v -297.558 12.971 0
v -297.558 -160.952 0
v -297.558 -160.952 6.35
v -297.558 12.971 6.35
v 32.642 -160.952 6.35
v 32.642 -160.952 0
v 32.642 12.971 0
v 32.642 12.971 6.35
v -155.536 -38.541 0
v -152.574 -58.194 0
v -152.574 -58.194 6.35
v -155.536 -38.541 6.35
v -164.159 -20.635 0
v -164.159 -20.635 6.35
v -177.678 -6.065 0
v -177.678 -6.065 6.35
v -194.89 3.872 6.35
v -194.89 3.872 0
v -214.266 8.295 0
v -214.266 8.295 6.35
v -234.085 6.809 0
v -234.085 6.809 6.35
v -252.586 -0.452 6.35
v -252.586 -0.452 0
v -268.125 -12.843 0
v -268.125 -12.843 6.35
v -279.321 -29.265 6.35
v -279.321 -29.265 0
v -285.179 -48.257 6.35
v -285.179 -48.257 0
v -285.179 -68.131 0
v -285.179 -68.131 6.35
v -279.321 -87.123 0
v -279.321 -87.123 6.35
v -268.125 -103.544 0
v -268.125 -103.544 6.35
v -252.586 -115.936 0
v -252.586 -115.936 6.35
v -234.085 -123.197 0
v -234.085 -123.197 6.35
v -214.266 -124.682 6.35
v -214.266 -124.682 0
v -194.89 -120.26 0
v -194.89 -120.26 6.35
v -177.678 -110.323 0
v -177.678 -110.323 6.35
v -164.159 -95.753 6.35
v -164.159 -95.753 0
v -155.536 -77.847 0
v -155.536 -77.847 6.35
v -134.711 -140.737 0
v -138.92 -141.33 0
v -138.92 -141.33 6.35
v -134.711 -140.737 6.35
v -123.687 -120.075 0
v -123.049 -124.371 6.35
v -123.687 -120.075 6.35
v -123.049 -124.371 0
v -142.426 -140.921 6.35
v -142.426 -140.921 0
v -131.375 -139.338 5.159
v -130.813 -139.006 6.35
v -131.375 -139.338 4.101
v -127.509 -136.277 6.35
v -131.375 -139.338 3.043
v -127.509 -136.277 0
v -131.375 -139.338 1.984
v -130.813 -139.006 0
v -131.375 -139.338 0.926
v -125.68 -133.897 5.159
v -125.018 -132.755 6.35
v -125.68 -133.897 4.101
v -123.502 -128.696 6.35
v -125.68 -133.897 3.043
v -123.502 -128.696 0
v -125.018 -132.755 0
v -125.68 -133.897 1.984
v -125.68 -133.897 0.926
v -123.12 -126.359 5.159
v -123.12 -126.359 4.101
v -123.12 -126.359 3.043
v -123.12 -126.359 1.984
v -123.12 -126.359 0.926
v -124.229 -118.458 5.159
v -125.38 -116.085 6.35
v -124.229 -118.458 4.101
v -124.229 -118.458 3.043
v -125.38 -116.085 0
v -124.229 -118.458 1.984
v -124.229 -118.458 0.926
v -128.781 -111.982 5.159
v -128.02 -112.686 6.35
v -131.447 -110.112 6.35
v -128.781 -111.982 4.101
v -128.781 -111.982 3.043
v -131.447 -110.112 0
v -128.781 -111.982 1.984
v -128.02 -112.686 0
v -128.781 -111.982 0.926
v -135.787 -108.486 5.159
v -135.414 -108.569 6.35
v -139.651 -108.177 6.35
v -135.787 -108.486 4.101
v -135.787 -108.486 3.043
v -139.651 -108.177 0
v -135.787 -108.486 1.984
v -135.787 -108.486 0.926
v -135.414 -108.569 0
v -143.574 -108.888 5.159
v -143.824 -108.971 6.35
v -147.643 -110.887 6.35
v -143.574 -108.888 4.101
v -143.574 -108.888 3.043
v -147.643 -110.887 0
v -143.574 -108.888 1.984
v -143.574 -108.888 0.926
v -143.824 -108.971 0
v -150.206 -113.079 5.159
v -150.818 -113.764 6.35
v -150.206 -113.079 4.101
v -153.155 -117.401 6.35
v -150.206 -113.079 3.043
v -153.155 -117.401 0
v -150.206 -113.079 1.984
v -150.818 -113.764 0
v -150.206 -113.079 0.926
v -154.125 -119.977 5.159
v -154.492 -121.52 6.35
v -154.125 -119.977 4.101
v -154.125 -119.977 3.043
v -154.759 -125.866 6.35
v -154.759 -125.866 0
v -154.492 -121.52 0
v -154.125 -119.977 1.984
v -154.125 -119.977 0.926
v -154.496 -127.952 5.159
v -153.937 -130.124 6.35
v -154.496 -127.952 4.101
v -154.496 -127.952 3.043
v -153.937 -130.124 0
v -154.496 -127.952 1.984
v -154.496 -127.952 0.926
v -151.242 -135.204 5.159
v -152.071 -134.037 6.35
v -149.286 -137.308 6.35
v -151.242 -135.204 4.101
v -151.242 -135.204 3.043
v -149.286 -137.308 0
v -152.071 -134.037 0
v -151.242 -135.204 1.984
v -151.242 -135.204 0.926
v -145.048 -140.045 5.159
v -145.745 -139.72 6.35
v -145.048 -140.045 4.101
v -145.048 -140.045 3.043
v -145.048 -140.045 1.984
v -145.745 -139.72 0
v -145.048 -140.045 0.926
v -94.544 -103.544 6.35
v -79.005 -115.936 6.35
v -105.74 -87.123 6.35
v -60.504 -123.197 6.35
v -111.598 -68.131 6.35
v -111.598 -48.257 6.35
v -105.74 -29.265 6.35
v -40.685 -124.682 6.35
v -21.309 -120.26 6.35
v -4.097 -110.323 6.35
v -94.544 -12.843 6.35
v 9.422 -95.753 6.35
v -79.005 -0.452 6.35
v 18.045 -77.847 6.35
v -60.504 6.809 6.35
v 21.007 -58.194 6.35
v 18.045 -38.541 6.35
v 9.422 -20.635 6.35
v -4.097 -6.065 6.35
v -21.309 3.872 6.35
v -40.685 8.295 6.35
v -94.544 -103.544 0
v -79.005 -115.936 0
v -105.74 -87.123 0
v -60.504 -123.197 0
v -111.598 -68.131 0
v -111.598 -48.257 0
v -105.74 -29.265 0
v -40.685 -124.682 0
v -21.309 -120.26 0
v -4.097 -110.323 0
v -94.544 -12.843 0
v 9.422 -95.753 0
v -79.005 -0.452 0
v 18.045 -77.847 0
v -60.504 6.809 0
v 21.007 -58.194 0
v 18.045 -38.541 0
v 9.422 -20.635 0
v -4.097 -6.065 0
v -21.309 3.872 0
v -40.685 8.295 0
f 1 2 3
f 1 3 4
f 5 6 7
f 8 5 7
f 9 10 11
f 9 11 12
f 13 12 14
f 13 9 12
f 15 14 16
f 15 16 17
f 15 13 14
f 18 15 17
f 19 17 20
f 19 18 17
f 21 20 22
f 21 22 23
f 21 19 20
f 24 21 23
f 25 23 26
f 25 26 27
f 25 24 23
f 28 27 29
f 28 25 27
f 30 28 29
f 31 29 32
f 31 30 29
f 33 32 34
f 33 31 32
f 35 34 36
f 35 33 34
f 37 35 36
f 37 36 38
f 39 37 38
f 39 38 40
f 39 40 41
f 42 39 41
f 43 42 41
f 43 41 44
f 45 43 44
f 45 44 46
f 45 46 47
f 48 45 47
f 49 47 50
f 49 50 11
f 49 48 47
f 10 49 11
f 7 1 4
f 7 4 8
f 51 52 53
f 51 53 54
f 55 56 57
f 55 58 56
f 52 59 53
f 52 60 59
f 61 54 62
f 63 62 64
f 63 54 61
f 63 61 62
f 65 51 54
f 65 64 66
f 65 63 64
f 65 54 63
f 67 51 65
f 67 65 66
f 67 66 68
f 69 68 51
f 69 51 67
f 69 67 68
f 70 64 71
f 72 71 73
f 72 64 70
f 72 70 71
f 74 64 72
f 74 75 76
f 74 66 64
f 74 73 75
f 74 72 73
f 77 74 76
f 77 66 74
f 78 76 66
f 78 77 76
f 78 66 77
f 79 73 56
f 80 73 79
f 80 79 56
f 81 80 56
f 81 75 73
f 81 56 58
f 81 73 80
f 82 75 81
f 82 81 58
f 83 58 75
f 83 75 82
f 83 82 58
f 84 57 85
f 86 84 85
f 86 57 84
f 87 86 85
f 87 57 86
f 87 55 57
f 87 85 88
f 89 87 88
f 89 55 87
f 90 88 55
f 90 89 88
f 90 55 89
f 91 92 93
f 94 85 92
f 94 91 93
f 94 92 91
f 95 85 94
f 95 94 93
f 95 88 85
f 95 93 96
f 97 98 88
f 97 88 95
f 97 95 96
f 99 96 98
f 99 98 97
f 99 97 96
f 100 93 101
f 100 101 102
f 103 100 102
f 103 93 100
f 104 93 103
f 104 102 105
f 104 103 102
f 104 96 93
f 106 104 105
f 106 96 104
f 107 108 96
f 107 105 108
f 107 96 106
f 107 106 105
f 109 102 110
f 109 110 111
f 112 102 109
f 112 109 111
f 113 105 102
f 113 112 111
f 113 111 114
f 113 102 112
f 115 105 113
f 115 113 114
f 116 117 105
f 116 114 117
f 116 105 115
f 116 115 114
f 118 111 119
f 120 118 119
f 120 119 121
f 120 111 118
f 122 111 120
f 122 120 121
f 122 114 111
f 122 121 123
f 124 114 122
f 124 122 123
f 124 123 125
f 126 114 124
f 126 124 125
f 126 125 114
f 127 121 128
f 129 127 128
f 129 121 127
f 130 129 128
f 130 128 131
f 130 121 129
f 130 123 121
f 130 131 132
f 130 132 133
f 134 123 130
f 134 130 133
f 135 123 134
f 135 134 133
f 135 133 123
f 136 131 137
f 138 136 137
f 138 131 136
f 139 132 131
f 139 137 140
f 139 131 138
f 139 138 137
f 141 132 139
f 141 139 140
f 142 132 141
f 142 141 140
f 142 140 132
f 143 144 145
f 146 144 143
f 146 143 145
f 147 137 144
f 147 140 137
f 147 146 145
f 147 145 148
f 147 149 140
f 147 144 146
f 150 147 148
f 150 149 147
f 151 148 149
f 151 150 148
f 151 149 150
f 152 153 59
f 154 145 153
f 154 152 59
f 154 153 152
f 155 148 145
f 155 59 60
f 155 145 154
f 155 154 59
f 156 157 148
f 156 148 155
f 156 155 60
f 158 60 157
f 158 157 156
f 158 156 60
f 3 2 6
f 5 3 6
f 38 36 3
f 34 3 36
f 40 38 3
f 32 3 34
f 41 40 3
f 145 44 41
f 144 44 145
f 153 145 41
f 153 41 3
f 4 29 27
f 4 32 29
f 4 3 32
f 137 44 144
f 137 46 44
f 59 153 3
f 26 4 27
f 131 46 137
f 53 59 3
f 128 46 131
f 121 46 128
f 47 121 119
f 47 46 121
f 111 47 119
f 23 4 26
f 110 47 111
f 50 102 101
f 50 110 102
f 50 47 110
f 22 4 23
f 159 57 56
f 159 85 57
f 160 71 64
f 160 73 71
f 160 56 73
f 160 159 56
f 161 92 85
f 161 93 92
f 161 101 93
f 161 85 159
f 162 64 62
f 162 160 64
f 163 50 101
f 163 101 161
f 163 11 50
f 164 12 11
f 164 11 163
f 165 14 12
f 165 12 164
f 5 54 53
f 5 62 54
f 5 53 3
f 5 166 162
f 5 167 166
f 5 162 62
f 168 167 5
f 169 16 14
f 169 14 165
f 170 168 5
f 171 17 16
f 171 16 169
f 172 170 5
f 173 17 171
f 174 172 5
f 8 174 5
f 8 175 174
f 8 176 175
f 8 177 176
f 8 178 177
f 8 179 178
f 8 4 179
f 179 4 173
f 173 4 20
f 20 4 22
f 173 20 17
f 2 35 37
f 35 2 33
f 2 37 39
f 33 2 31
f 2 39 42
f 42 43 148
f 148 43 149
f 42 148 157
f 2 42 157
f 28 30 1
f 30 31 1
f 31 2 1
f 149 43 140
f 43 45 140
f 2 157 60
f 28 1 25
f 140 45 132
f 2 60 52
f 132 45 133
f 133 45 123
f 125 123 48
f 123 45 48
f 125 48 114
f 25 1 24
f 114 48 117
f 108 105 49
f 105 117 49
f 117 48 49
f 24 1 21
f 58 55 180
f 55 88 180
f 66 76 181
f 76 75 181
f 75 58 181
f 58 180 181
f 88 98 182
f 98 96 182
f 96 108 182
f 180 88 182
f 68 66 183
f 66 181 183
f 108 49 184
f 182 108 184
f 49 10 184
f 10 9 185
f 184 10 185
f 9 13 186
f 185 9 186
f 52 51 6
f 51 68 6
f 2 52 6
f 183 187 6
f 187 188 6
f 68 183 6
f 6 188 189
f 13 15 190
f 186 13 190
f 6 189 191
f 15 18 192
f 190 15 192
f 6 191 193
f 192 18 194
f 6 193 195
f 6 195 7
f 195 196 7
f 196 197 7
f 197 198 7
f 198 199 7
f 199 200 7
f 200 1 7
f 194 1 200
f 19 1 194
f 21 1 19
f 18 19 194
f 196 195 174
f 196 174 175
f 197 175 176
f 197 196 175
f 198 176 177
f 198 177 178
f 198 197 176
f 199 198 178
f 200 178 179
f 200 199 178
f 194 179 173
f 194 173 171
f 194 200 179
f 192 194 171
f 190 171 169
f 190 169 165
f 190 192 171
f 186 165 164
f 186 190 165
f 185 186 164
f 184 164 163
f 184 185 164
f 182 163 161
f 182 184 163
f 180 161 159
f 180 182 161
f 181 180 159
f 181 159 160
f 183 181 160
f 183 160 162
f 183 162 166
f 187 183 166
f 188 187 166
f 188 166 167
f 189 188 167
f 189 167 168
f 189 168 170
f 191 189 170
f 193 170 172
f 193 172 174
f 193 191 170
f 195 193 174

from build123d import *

# Parameters (mm, degrees)
F0_W     = 330.2
F0_H     = 173.9225888619
F0_R     = 66.675
F1_DEPTH = 6.35


# Not quite as in the source:
# - the dataset's text gives a spline's control points without its knots; the knots are read off the source's solid


with BuildPart() as f1:
    # F0 (on Top) → F1 (new body)
    with BuildSketch(Plane.XY):
        with Locations((-132.4583572531, -73.9906652679)):
            Rectangle(F0_W, F0_H)
        with BuildLine():
            add(Edge.make_bspline(
                [(-138.9201402808, -141.3304854369), (-138.3928185407, -141.3304854369), (-137.3381750605, -141.275400301), (-135.2625215798, -140.9492902881), (-133.2552416123, -140.3064688013), (-131.3632448334, -139.3625418043), (-129.5649193209, -138.2239224731), (-127.5612000685, -136.4834555233), (-125.9244832491, -134.3798930655), (-124.862585277, -132.5093025607), (-123.9869219901, -130.5516065921), (-123.3950651292, -128.4884227829), (-123.095646983, -126.3629935264), (-123.0198869297, -124.7450926538), (-123.095646983, -123.1271917812), (-123.3950651292, -121.0017625246), (-123.9869219901, -118.9385787154), (-124.862585277, -116.9808827469), (-125.9244832491, -115.110292242), (-127.5612000685, -113.0067297843), (-129.5649193209, -111.2662628345), (-131.3632448334, -110.1276435032), (-133.2552416123, -109.1837165063), (-135.2625215798, -108.5408950195), (-137.3381750605, -108.2147850066), (-138.9201402808, -108.1321573027), (-140.5021055011, -108.2147850066), (-142.5777589818, -108.5408950195), (-144.5850389493, -109.1837165063), (-146.4770357282, -110.1276435032), (-148.2753612407, -111.2662628345), (-150.2790804931, -113.0067297843), (-151.9157973125, -115.110292242), (-152.9776952845, -116.9808827469), (-153.8533585715, -118.9385787154), (-154.4452154324, -121.0017625246), (-154.7446335786, -123.1271917812), (-154.8203936319, -124.7450926538), (-154.7446335786, -126.3629935264), (-154.4452154324, -128.4884227829), (-153.8533585715, -130.5516065921), (-152.9776952845, -132.5093025607), (-151.9157973125, -134.3798930655), (-150.2790804931, -136.4834555233), (-148.2753612407, -138.2239224731), (-146.4770357282, -139.3625418043), (-144.5850389493, -140.3064688013), (-142.5777589818, -140.9492902881), (-140.5021055011, -141.275400301), (-139.4474620209, -141.3304854369), (-138.9201402808, -141.3304854369)],
                knots=[0, 0, 0, 0, 0.015625, 0.03125, 0.0625, 0.078125, 0.09375, 0.125, 0.15625, 0.171875, 0.1875, 0.21875, 0.234375, 0.25, 0.265625, 0.28125, 0.3125, 0.328125, 0.34375, 0.375, 0.40625, 0.421875, 0.4375, 0.46875, 0.484375, 0.5, 0.515625, 0.53125, 0.5625, 0.578125, 0.59375, 0.625, 0.65625, 0.671875, 0.6875, 0.71875, 0.734375, 0.75, 0.765625, 0.78125, 0.8125, 0.828125, 0.84375, 0.875, 0.90625, 0.921875, 0.9375, 0.96875, 0.984375, 1, 1, 1, 1], degree=3))
        make_face(mode=Mode.SUBTRACT)
        with Locations((-219.2488735842, -58.1939341619)):
            Circle(F0_R, mode=Mode.SUBTRACT)
        with Locations((-45.6678409221, -58.1939341619)):
            Circle(F0_R, mode=Mode.SUBTRACT)
    extrude(amount=F1_DEPTH)


solid = f1.part
